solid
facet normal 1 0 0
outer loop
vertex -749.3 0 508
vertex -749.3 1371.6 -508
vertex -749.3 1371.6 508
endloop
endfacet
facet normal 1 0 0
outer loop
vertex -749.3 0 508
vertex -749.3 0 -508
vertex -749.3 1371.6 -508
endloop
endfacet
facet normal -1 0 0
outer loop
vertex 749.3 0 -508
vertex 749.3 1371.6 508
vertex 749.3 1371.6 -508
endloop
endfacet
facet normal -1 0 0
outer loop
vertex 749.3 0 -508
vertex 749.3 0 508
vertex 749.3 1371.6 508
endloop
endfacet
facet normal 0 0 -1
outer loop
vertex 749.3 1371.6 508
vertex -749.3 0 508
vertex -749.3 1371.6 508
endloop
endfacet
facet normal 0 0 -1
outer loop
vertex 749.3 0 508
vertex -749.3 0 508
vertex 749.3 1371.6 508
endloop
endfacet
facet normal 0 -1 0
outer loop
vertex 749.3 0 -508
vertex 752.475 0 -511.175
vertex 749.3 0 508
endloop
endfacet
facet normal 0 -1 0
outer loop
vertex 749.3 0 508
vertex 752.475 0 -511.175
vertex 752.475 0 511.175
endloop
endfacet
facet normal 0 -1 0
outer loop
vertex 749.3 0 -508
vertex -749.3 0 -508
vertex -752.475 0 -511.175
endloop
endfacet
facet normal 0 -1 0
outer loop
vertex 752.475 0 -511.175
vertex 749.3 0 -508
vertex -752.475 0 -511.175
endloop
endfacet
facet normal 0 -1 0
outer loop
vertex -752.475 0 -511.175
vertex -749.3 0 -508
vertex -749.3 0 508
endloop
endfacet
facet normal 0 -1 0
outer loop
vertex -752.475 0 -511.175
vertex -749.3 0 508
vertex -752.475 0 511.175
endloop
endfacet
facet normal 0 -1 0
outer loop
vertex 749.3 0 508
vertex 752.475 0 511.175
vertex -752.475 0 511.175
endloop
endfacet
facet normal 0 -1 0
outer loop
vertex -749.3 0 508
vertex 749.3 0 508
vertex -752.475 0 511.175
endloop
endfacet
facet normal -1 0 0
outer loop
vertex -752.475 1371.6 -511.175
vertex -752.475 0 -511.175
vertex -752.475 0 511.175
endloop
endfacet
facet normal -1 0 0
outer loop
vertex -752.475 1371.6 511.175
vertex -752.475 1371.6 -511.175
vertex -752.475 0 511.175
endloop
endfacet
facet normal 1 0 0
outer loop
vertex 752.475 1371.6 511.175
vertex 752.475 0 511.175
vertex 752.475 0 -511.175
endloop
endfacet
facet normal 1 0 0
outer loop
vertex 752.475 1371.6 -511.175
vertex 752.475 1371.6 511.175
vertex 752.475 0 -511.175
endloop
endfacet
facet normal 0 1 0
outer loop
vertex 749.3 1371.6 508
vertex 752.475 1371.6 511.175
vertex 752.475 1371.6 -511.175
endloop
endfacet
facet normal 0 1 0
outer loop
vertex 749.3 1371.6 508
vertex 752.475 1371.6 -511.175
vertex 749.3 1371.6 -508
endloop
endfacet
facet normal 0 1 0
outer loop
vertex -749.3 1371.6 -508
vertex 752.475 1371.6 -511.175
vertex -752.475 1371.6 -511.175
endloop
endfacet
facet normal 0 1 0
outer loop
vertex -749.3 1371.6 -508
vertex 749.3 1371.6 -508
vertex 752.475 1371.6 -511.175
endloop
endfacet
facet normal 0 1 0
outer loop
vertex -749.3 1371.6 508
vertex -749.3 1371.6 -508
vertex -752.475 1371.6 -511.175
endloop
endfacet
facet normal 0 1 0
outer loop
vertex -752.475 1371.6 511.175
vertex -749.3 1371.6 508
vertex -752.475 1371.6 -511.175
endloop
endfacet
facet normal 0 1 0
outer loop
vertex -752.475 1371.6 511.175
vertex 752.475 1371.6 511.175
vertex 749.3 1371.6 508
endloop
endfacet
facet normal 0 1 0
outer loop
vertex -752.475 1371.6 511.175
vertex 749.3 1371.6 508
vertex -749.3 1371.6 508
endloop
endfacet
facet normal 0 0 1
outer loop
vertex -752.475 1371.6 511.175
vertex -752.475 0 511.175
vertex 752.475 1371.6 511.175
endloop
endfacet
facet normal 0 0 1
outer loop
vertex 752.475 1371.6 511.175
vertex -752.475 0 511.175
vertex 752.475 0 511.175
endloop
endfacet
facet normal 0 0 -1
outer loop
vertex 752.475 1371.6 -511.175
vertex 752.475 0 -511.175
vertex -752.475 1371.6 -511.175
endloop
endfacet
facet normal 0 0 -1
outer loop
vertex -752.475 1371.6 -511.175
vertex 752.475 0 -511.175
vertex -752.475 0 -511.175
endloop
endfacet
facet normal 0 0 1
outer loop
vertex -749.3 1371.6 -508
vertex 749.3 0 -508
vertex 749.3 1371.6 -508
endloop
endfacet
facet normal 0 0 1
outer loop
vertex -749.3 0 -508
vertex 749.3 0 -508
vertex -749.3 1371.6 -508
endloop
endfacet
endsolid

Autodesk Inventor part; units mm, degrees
ref_plane "YZ Plane" through (0, 0, 0) normal (1, 0, 0) x (0, 1, 0)
ref_plane "XZ Plane" through (0, 0, 0) normal (0, 1, 0) x (-1, 0, 0)
ref_plane "XY Plane" through (0, 0, 0) normal (0, 0, 1) x (1, 0, 0)
sketch "Sketch2" plane through (0, 0, 0) normal (0, 1, 0) x (-1, 0, 0)
  line L0 (-749.3, 508) -> (-749.3, -508)
  line L1 (-749.3, -508) -> (749.3, -508)
  line L2 (749.3, -508) -> (749.3, 508)
  line L3 (749.3, 508) -> (-749.3, 508)
  line L4 (-749.3, 508) -> (749.3, -508) construction
  line L5 (-749.3, -508) -> (749.3, 508) construction
  line L6 (-752.475, 511.175) -> (-752.475, -511.175)
  line L7 (-752.475, -511.175) -> (752.475, -511.175)
  line L8 (752.475, -511.175) -> (752.475, 511.175)
  line L9 (752.475, 511.175) -> (-752.475, 511.175)
  line L10 (-752.475, 511.175) -> (752.475, -511.175) construction
  line L11 (-752.475, -511.175) -> (752.475, 511.175) construction
  point P0 (0, 0)
  dimension "d4" = 1016
  dimension "d5" = 1498.6
  dimension "d6" = 3.175
  dimension "d7" = 3.175
extrude "Extrusion1" add sketch "Sketch2" along normal blind 1371.6
equation "\"d4\" = maxMatchWidth"
equation "\"d5\" = maxMatchLength"
equation "\"d6\" = modelThickness"
equation "\"d7\" = modelThickness"
equation "\"d8\" = maxMatchHeight"
equation "\"robotLength\" = 736.6"
equation "\"robotWidth\" = 254"
equation "\"robotPerimeter\" = 2 * robotLength + 2 * robotWidth"
equation "\"maxMatchLength\" = robotLength + 2 * matchExtension"
equation "\"matchExtension\" = 381"
equation "\"maxMatchWidth\" = robotWidth + 2 * matchExtension"
equation "\"modelThickness\" = 3.175"
equation "\"maxMatchHeight\" = 1371.6"
properties part number "RhinoV19MaxVolume" material "Polycarbonate, Smoke"
